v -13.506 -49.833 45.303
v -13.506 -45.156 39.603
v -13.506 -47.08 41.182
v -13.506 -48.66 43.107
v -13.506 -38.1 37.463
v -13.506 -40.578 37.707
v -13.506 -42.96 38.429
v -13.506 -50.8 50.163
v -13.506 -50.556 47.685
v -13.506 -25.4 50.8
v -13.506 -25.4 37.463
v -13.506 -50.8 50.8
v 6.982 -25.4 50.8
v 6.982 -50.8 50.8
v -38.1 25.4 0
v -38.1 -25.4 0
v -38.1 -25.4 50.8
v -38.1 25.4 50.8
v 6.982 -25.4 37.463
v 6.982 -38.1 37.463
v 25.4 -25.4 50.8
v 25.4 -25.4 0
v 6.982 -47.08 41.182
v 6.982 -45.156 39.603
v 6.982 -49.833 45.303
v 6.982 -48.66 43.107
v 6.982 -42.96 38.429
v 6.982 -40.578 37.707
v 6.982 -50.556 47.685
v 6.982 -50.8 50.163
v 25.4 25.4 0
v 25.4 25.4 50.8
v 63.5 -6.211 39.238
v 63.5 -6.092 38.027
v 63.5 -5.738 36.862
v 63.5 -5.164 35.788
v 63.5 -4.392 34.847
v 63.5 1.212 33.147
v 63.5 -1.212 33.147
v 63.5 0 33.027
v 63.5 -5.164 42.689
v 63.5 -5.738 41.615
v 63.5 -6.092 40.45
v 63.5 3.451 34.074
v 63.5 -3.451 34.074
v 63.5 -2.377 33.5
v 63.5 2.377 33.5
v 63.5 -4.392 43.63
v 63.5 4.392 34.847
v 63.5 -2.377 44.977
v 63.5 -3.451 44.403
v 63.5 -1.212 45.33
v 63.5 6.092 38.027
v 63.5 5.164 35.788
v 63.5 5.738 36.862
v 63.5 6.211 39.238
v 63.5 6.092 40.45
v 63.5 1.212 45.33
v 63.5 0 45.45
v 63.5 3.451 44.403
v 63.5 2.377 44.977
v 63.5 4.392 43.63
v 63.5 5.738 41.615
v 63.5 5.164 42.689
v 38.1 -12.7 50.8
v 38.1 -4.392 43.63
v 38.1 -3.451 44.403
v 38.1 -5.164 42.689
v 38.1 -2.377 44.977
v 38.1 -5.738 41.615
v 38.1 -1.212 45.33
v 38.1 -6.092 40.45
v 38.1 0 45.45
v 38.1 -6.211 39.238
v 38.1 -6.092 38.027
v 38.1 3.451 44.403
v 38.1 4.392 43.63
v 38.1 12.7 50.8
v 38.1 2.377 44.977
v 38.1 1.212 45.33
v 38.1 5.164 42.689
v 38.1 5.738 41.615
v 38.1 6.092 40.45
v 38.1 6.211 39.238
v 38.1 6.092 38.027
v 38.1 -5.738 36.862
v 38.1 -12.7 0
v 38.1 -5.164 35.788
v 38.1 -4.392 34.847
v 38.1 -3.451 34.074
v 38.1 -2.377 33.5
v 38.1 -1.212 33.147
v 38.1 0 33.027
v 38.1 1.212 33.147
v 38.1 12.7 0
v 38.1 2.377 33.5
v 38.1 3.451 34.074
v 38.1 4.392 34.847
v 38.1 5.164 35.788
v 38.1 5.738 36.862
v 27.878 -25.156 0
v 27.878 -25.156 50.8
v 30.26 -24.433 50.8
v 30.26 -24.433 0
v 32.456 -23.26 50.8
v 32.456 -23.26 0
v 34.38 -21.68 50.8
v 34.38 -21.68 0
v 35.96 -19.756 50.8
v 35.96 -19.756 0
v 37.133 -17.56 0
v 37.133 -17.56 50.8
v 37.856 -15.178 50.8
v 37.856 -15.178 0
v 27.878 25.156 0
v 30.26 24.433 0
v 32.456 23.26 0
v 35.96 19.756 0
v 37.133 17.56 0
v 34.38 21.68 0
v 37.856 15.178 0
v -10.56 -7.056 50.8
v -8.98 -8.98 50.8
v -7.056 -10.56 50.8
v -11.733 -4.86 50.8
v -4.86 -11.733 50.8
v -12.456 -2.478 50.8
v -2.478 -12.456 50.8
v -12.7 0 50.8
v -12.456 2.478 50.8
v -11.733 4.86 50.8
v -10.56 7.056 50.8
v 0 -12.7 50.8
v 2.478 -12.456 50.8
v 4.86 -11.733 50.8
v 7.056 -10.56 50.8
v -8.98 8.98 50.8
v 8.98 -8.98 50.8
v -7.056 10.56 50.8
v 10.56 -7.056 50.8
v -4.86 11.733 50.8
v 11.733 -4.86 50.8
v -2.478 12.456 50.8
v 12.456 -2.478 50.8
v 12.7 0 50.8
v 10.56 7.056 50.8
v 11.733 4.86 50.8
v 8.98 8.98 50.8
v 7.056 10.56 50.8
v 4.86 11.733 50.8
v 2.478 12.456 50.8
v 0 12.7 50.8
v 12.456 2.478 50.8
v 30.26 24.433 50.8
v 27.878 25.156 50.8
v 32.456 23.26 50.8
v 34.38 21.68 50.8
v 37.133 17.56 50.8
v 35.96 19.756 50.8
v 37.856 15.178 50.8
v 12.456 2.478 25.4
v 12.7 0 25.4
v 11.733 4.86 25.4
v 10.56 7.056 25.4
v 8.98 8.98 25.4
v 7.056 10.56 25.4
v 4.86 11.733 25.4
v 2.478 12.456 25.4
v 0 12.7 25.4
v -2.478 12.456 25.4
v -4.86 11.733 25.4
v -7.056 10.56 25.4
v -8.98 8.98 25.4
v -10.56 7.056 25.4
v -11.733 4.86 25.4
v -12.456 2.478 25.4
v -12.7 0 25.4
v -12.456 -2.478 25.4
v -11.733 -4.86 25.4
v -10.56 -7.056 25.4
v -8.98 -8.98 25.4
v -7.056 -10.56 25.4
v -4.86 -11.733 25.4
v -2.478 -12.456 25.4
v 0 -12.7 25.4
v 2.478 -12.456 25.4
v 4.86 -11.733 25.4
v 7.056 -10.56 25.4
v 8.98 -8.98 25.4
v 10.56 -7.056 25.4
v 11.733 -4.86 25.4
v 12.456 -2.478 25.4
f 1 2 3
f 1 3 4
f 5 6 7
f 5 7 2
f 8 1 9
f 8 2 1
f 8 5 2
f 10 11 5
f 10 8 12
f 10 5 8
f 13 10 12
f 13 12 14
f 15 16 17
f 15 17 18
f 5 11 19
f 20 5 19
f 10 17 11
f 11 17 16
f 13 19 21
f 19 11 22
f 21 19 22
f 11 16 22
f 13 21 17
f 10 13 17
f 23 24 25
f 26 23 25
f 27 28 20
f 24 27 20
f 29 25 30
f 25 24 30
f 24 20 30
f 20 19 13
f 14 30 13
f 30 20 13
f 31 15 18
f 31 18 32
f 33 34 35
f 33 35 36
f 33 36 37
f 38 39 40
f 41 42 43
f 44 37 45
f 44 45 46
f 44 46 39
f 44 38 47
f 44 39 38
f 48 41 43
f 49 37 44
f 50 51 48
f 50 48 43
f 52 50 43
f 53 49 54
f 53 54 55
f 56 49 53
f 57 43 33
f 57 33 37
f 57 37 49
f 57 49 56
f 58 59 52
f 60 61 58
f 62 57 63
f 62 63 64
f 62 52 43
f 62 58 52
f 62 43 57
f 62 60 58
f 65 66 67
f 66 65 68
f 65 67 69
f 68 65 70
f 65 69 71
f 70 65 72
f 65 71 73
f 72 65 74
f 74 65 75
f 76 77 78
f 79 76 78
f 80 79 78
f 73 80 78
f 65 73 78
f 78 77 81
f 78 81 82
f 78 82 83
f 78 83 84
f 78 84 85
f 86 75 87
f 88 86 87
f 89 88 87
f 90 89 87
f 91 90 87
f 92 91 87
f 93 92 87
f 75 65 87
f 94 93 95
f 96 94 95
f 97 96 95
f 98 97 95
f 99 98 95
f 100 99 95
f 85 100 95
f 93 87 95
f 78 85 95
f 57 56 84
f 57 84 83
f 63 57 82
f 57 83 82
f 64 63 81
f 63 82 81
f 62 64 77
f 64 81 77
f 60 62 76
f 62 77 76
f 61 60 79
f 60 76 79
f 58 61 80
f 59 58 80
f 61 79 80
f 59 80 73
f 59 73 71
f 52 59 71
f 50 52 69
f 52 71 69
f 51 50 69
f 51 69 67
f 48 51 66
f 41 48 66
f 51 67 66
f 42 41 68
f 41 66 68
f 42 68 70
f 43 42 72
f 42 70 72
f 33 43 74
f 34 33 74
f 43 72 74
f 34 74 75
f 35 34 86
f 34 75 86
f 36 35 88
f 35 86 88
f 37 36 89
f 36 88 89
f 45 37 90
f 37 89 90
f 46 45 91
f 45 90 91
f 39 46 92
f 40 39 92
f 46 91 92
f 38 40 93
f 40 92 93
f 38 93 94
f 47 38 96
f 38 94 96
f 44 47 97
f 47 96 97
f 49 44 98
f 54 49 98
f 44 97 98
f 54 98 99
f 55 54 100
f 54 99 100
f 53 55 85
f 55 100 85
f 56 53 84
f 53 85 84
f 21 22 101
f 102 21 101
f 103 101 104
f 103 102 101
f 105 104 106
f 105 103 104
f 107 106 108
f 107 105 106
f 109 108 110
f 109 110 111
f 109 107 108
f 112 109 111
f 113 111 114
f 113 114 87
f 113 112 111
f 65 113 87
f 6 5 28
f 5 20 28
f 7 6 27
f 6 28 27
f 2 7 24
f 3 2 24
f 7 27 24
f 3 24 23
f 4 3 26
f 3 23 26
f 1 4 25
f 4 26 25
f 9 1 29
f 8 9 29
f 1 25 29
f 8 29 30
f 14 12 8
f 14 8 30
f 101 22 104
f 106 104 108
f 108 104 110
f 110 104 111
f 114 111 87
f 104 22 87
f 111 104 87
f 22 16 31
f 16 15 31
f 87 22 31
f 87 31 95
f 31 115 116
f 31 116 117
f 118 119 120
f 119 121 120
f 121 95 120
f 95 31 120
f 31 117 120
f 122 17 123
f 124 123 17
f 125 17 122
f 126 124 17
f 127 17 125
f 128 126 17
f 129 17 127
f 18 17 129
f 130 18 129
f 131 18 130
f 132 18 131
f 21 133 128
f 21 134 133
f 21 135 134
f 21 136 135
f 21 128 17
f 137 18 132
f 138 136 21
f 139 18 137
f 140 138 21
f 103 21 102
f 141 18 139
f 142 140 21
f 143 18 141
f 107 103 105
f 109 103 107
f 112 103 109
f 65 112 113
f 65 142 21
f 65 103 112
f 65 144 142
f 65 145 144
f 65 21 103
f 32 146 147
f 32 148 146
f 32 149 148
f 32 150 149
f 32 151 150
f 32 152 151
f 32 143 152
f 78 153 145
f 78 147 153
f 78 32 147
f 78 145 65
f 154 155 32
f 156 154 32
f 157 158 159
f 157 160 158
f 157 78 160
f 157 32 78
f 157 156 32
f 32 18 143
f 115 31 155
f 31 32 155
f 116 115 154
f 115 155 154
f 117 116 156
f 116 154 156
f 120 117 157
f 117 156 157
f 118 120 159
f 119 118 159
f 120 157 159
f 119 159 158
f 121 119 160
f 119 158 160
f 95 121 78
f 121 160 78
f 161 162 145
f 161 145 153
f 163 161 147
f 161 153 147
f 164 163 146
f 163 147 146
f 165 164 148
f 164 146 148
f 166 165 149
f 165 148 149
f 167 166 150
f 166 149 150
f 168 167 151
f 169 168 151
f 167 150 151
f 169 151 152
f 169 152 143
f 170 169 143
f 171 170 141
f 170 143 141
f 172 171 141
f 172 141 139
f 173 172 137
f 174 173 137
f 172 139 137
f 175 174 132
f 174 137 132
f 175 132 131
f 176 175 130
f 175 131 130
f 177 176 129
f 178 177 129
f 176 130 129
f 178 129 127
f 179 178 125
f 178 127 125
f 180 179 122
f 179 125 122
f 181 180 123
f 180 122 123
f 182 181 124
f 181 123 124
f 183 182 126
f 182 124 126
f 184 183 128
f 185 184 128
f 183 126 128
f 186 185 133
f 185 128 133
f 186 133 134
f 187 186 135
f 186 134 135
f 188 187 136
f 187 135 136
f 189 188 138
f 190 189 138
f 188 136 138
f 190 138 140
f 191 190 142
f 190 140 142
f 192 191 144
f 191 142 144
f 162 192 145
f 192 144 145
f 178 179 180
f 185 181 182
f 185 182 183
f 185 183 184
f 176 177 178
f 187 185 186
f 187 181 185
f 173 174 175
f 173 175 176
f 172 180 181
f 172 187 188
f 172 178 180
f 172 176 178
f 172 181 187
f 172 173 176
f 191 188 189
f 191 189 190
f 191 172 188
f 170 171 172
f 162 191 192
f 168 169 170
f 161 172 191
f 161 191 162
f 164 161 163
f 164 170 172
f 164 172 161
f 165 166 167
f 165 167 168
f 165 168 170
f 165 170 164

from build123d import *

# Parameters (mm, degrees)
F0_W     = 76.2
F0_H     = 50.8
F1_DEPTH = 50.8
F2_R     = 12.7
F3_DEPTH = 25.4
F4_R     = 12.7
F5_W     = 20.487596
F5_H     = 13.337251
F6_DEPTH = 25.4
F7_R     = 12.7
F8_R     = 6.211161
F9_DEPTH = 25.4


with BuildPart() as f1:
    # F0 (on Top) → F1 (new body)
    with BuildSketch(Plane.XY):
        Rectangle(F0_W, F0_H)
    extrude(amount=F1_DEPTH)

    # F2 (on face) → F3 (cut)
    with BuildSketch(Plane.XY.offset(50.8)):
        Circle(F2_R)
    extrude(amount=-F3_DEPTH, mode=Mode.SUBTRACT)

    # F4
    f4_edges = [f1.edges().sort_by_distance(p)[0] for p in [
        (38.1, -25.4, 25.4),
        (38.1, 25.4, 25.4),
    ]]
    fillet(f4_edges, radius=F4_R)

    # F5 (on face) → F6 (join)
    with BuildSketch(Plane.XZ.offset(25.4)):
        with Locations((-3.261952, 44.131374)):
            Rectangle(F5_W, F5_H)
    extrude(amount=F6_DEPTH)

    # F7
    f7_edges = [f1.edges().sort_by_distance(p)[0] for p in [
        (-3.261952, -50.8, 37.462749),
    ]]
    fillet(f7_edges, radius=F7_R)

    # F8 (on face) → F9 (join)
    with BuildSketch(Plane.YZ.offset(38.1)):
        with Locations((0, 39.23849)):
            Circle(F8_R)
    extrude(amount=F9_DEPTH)


solid = f1.part
